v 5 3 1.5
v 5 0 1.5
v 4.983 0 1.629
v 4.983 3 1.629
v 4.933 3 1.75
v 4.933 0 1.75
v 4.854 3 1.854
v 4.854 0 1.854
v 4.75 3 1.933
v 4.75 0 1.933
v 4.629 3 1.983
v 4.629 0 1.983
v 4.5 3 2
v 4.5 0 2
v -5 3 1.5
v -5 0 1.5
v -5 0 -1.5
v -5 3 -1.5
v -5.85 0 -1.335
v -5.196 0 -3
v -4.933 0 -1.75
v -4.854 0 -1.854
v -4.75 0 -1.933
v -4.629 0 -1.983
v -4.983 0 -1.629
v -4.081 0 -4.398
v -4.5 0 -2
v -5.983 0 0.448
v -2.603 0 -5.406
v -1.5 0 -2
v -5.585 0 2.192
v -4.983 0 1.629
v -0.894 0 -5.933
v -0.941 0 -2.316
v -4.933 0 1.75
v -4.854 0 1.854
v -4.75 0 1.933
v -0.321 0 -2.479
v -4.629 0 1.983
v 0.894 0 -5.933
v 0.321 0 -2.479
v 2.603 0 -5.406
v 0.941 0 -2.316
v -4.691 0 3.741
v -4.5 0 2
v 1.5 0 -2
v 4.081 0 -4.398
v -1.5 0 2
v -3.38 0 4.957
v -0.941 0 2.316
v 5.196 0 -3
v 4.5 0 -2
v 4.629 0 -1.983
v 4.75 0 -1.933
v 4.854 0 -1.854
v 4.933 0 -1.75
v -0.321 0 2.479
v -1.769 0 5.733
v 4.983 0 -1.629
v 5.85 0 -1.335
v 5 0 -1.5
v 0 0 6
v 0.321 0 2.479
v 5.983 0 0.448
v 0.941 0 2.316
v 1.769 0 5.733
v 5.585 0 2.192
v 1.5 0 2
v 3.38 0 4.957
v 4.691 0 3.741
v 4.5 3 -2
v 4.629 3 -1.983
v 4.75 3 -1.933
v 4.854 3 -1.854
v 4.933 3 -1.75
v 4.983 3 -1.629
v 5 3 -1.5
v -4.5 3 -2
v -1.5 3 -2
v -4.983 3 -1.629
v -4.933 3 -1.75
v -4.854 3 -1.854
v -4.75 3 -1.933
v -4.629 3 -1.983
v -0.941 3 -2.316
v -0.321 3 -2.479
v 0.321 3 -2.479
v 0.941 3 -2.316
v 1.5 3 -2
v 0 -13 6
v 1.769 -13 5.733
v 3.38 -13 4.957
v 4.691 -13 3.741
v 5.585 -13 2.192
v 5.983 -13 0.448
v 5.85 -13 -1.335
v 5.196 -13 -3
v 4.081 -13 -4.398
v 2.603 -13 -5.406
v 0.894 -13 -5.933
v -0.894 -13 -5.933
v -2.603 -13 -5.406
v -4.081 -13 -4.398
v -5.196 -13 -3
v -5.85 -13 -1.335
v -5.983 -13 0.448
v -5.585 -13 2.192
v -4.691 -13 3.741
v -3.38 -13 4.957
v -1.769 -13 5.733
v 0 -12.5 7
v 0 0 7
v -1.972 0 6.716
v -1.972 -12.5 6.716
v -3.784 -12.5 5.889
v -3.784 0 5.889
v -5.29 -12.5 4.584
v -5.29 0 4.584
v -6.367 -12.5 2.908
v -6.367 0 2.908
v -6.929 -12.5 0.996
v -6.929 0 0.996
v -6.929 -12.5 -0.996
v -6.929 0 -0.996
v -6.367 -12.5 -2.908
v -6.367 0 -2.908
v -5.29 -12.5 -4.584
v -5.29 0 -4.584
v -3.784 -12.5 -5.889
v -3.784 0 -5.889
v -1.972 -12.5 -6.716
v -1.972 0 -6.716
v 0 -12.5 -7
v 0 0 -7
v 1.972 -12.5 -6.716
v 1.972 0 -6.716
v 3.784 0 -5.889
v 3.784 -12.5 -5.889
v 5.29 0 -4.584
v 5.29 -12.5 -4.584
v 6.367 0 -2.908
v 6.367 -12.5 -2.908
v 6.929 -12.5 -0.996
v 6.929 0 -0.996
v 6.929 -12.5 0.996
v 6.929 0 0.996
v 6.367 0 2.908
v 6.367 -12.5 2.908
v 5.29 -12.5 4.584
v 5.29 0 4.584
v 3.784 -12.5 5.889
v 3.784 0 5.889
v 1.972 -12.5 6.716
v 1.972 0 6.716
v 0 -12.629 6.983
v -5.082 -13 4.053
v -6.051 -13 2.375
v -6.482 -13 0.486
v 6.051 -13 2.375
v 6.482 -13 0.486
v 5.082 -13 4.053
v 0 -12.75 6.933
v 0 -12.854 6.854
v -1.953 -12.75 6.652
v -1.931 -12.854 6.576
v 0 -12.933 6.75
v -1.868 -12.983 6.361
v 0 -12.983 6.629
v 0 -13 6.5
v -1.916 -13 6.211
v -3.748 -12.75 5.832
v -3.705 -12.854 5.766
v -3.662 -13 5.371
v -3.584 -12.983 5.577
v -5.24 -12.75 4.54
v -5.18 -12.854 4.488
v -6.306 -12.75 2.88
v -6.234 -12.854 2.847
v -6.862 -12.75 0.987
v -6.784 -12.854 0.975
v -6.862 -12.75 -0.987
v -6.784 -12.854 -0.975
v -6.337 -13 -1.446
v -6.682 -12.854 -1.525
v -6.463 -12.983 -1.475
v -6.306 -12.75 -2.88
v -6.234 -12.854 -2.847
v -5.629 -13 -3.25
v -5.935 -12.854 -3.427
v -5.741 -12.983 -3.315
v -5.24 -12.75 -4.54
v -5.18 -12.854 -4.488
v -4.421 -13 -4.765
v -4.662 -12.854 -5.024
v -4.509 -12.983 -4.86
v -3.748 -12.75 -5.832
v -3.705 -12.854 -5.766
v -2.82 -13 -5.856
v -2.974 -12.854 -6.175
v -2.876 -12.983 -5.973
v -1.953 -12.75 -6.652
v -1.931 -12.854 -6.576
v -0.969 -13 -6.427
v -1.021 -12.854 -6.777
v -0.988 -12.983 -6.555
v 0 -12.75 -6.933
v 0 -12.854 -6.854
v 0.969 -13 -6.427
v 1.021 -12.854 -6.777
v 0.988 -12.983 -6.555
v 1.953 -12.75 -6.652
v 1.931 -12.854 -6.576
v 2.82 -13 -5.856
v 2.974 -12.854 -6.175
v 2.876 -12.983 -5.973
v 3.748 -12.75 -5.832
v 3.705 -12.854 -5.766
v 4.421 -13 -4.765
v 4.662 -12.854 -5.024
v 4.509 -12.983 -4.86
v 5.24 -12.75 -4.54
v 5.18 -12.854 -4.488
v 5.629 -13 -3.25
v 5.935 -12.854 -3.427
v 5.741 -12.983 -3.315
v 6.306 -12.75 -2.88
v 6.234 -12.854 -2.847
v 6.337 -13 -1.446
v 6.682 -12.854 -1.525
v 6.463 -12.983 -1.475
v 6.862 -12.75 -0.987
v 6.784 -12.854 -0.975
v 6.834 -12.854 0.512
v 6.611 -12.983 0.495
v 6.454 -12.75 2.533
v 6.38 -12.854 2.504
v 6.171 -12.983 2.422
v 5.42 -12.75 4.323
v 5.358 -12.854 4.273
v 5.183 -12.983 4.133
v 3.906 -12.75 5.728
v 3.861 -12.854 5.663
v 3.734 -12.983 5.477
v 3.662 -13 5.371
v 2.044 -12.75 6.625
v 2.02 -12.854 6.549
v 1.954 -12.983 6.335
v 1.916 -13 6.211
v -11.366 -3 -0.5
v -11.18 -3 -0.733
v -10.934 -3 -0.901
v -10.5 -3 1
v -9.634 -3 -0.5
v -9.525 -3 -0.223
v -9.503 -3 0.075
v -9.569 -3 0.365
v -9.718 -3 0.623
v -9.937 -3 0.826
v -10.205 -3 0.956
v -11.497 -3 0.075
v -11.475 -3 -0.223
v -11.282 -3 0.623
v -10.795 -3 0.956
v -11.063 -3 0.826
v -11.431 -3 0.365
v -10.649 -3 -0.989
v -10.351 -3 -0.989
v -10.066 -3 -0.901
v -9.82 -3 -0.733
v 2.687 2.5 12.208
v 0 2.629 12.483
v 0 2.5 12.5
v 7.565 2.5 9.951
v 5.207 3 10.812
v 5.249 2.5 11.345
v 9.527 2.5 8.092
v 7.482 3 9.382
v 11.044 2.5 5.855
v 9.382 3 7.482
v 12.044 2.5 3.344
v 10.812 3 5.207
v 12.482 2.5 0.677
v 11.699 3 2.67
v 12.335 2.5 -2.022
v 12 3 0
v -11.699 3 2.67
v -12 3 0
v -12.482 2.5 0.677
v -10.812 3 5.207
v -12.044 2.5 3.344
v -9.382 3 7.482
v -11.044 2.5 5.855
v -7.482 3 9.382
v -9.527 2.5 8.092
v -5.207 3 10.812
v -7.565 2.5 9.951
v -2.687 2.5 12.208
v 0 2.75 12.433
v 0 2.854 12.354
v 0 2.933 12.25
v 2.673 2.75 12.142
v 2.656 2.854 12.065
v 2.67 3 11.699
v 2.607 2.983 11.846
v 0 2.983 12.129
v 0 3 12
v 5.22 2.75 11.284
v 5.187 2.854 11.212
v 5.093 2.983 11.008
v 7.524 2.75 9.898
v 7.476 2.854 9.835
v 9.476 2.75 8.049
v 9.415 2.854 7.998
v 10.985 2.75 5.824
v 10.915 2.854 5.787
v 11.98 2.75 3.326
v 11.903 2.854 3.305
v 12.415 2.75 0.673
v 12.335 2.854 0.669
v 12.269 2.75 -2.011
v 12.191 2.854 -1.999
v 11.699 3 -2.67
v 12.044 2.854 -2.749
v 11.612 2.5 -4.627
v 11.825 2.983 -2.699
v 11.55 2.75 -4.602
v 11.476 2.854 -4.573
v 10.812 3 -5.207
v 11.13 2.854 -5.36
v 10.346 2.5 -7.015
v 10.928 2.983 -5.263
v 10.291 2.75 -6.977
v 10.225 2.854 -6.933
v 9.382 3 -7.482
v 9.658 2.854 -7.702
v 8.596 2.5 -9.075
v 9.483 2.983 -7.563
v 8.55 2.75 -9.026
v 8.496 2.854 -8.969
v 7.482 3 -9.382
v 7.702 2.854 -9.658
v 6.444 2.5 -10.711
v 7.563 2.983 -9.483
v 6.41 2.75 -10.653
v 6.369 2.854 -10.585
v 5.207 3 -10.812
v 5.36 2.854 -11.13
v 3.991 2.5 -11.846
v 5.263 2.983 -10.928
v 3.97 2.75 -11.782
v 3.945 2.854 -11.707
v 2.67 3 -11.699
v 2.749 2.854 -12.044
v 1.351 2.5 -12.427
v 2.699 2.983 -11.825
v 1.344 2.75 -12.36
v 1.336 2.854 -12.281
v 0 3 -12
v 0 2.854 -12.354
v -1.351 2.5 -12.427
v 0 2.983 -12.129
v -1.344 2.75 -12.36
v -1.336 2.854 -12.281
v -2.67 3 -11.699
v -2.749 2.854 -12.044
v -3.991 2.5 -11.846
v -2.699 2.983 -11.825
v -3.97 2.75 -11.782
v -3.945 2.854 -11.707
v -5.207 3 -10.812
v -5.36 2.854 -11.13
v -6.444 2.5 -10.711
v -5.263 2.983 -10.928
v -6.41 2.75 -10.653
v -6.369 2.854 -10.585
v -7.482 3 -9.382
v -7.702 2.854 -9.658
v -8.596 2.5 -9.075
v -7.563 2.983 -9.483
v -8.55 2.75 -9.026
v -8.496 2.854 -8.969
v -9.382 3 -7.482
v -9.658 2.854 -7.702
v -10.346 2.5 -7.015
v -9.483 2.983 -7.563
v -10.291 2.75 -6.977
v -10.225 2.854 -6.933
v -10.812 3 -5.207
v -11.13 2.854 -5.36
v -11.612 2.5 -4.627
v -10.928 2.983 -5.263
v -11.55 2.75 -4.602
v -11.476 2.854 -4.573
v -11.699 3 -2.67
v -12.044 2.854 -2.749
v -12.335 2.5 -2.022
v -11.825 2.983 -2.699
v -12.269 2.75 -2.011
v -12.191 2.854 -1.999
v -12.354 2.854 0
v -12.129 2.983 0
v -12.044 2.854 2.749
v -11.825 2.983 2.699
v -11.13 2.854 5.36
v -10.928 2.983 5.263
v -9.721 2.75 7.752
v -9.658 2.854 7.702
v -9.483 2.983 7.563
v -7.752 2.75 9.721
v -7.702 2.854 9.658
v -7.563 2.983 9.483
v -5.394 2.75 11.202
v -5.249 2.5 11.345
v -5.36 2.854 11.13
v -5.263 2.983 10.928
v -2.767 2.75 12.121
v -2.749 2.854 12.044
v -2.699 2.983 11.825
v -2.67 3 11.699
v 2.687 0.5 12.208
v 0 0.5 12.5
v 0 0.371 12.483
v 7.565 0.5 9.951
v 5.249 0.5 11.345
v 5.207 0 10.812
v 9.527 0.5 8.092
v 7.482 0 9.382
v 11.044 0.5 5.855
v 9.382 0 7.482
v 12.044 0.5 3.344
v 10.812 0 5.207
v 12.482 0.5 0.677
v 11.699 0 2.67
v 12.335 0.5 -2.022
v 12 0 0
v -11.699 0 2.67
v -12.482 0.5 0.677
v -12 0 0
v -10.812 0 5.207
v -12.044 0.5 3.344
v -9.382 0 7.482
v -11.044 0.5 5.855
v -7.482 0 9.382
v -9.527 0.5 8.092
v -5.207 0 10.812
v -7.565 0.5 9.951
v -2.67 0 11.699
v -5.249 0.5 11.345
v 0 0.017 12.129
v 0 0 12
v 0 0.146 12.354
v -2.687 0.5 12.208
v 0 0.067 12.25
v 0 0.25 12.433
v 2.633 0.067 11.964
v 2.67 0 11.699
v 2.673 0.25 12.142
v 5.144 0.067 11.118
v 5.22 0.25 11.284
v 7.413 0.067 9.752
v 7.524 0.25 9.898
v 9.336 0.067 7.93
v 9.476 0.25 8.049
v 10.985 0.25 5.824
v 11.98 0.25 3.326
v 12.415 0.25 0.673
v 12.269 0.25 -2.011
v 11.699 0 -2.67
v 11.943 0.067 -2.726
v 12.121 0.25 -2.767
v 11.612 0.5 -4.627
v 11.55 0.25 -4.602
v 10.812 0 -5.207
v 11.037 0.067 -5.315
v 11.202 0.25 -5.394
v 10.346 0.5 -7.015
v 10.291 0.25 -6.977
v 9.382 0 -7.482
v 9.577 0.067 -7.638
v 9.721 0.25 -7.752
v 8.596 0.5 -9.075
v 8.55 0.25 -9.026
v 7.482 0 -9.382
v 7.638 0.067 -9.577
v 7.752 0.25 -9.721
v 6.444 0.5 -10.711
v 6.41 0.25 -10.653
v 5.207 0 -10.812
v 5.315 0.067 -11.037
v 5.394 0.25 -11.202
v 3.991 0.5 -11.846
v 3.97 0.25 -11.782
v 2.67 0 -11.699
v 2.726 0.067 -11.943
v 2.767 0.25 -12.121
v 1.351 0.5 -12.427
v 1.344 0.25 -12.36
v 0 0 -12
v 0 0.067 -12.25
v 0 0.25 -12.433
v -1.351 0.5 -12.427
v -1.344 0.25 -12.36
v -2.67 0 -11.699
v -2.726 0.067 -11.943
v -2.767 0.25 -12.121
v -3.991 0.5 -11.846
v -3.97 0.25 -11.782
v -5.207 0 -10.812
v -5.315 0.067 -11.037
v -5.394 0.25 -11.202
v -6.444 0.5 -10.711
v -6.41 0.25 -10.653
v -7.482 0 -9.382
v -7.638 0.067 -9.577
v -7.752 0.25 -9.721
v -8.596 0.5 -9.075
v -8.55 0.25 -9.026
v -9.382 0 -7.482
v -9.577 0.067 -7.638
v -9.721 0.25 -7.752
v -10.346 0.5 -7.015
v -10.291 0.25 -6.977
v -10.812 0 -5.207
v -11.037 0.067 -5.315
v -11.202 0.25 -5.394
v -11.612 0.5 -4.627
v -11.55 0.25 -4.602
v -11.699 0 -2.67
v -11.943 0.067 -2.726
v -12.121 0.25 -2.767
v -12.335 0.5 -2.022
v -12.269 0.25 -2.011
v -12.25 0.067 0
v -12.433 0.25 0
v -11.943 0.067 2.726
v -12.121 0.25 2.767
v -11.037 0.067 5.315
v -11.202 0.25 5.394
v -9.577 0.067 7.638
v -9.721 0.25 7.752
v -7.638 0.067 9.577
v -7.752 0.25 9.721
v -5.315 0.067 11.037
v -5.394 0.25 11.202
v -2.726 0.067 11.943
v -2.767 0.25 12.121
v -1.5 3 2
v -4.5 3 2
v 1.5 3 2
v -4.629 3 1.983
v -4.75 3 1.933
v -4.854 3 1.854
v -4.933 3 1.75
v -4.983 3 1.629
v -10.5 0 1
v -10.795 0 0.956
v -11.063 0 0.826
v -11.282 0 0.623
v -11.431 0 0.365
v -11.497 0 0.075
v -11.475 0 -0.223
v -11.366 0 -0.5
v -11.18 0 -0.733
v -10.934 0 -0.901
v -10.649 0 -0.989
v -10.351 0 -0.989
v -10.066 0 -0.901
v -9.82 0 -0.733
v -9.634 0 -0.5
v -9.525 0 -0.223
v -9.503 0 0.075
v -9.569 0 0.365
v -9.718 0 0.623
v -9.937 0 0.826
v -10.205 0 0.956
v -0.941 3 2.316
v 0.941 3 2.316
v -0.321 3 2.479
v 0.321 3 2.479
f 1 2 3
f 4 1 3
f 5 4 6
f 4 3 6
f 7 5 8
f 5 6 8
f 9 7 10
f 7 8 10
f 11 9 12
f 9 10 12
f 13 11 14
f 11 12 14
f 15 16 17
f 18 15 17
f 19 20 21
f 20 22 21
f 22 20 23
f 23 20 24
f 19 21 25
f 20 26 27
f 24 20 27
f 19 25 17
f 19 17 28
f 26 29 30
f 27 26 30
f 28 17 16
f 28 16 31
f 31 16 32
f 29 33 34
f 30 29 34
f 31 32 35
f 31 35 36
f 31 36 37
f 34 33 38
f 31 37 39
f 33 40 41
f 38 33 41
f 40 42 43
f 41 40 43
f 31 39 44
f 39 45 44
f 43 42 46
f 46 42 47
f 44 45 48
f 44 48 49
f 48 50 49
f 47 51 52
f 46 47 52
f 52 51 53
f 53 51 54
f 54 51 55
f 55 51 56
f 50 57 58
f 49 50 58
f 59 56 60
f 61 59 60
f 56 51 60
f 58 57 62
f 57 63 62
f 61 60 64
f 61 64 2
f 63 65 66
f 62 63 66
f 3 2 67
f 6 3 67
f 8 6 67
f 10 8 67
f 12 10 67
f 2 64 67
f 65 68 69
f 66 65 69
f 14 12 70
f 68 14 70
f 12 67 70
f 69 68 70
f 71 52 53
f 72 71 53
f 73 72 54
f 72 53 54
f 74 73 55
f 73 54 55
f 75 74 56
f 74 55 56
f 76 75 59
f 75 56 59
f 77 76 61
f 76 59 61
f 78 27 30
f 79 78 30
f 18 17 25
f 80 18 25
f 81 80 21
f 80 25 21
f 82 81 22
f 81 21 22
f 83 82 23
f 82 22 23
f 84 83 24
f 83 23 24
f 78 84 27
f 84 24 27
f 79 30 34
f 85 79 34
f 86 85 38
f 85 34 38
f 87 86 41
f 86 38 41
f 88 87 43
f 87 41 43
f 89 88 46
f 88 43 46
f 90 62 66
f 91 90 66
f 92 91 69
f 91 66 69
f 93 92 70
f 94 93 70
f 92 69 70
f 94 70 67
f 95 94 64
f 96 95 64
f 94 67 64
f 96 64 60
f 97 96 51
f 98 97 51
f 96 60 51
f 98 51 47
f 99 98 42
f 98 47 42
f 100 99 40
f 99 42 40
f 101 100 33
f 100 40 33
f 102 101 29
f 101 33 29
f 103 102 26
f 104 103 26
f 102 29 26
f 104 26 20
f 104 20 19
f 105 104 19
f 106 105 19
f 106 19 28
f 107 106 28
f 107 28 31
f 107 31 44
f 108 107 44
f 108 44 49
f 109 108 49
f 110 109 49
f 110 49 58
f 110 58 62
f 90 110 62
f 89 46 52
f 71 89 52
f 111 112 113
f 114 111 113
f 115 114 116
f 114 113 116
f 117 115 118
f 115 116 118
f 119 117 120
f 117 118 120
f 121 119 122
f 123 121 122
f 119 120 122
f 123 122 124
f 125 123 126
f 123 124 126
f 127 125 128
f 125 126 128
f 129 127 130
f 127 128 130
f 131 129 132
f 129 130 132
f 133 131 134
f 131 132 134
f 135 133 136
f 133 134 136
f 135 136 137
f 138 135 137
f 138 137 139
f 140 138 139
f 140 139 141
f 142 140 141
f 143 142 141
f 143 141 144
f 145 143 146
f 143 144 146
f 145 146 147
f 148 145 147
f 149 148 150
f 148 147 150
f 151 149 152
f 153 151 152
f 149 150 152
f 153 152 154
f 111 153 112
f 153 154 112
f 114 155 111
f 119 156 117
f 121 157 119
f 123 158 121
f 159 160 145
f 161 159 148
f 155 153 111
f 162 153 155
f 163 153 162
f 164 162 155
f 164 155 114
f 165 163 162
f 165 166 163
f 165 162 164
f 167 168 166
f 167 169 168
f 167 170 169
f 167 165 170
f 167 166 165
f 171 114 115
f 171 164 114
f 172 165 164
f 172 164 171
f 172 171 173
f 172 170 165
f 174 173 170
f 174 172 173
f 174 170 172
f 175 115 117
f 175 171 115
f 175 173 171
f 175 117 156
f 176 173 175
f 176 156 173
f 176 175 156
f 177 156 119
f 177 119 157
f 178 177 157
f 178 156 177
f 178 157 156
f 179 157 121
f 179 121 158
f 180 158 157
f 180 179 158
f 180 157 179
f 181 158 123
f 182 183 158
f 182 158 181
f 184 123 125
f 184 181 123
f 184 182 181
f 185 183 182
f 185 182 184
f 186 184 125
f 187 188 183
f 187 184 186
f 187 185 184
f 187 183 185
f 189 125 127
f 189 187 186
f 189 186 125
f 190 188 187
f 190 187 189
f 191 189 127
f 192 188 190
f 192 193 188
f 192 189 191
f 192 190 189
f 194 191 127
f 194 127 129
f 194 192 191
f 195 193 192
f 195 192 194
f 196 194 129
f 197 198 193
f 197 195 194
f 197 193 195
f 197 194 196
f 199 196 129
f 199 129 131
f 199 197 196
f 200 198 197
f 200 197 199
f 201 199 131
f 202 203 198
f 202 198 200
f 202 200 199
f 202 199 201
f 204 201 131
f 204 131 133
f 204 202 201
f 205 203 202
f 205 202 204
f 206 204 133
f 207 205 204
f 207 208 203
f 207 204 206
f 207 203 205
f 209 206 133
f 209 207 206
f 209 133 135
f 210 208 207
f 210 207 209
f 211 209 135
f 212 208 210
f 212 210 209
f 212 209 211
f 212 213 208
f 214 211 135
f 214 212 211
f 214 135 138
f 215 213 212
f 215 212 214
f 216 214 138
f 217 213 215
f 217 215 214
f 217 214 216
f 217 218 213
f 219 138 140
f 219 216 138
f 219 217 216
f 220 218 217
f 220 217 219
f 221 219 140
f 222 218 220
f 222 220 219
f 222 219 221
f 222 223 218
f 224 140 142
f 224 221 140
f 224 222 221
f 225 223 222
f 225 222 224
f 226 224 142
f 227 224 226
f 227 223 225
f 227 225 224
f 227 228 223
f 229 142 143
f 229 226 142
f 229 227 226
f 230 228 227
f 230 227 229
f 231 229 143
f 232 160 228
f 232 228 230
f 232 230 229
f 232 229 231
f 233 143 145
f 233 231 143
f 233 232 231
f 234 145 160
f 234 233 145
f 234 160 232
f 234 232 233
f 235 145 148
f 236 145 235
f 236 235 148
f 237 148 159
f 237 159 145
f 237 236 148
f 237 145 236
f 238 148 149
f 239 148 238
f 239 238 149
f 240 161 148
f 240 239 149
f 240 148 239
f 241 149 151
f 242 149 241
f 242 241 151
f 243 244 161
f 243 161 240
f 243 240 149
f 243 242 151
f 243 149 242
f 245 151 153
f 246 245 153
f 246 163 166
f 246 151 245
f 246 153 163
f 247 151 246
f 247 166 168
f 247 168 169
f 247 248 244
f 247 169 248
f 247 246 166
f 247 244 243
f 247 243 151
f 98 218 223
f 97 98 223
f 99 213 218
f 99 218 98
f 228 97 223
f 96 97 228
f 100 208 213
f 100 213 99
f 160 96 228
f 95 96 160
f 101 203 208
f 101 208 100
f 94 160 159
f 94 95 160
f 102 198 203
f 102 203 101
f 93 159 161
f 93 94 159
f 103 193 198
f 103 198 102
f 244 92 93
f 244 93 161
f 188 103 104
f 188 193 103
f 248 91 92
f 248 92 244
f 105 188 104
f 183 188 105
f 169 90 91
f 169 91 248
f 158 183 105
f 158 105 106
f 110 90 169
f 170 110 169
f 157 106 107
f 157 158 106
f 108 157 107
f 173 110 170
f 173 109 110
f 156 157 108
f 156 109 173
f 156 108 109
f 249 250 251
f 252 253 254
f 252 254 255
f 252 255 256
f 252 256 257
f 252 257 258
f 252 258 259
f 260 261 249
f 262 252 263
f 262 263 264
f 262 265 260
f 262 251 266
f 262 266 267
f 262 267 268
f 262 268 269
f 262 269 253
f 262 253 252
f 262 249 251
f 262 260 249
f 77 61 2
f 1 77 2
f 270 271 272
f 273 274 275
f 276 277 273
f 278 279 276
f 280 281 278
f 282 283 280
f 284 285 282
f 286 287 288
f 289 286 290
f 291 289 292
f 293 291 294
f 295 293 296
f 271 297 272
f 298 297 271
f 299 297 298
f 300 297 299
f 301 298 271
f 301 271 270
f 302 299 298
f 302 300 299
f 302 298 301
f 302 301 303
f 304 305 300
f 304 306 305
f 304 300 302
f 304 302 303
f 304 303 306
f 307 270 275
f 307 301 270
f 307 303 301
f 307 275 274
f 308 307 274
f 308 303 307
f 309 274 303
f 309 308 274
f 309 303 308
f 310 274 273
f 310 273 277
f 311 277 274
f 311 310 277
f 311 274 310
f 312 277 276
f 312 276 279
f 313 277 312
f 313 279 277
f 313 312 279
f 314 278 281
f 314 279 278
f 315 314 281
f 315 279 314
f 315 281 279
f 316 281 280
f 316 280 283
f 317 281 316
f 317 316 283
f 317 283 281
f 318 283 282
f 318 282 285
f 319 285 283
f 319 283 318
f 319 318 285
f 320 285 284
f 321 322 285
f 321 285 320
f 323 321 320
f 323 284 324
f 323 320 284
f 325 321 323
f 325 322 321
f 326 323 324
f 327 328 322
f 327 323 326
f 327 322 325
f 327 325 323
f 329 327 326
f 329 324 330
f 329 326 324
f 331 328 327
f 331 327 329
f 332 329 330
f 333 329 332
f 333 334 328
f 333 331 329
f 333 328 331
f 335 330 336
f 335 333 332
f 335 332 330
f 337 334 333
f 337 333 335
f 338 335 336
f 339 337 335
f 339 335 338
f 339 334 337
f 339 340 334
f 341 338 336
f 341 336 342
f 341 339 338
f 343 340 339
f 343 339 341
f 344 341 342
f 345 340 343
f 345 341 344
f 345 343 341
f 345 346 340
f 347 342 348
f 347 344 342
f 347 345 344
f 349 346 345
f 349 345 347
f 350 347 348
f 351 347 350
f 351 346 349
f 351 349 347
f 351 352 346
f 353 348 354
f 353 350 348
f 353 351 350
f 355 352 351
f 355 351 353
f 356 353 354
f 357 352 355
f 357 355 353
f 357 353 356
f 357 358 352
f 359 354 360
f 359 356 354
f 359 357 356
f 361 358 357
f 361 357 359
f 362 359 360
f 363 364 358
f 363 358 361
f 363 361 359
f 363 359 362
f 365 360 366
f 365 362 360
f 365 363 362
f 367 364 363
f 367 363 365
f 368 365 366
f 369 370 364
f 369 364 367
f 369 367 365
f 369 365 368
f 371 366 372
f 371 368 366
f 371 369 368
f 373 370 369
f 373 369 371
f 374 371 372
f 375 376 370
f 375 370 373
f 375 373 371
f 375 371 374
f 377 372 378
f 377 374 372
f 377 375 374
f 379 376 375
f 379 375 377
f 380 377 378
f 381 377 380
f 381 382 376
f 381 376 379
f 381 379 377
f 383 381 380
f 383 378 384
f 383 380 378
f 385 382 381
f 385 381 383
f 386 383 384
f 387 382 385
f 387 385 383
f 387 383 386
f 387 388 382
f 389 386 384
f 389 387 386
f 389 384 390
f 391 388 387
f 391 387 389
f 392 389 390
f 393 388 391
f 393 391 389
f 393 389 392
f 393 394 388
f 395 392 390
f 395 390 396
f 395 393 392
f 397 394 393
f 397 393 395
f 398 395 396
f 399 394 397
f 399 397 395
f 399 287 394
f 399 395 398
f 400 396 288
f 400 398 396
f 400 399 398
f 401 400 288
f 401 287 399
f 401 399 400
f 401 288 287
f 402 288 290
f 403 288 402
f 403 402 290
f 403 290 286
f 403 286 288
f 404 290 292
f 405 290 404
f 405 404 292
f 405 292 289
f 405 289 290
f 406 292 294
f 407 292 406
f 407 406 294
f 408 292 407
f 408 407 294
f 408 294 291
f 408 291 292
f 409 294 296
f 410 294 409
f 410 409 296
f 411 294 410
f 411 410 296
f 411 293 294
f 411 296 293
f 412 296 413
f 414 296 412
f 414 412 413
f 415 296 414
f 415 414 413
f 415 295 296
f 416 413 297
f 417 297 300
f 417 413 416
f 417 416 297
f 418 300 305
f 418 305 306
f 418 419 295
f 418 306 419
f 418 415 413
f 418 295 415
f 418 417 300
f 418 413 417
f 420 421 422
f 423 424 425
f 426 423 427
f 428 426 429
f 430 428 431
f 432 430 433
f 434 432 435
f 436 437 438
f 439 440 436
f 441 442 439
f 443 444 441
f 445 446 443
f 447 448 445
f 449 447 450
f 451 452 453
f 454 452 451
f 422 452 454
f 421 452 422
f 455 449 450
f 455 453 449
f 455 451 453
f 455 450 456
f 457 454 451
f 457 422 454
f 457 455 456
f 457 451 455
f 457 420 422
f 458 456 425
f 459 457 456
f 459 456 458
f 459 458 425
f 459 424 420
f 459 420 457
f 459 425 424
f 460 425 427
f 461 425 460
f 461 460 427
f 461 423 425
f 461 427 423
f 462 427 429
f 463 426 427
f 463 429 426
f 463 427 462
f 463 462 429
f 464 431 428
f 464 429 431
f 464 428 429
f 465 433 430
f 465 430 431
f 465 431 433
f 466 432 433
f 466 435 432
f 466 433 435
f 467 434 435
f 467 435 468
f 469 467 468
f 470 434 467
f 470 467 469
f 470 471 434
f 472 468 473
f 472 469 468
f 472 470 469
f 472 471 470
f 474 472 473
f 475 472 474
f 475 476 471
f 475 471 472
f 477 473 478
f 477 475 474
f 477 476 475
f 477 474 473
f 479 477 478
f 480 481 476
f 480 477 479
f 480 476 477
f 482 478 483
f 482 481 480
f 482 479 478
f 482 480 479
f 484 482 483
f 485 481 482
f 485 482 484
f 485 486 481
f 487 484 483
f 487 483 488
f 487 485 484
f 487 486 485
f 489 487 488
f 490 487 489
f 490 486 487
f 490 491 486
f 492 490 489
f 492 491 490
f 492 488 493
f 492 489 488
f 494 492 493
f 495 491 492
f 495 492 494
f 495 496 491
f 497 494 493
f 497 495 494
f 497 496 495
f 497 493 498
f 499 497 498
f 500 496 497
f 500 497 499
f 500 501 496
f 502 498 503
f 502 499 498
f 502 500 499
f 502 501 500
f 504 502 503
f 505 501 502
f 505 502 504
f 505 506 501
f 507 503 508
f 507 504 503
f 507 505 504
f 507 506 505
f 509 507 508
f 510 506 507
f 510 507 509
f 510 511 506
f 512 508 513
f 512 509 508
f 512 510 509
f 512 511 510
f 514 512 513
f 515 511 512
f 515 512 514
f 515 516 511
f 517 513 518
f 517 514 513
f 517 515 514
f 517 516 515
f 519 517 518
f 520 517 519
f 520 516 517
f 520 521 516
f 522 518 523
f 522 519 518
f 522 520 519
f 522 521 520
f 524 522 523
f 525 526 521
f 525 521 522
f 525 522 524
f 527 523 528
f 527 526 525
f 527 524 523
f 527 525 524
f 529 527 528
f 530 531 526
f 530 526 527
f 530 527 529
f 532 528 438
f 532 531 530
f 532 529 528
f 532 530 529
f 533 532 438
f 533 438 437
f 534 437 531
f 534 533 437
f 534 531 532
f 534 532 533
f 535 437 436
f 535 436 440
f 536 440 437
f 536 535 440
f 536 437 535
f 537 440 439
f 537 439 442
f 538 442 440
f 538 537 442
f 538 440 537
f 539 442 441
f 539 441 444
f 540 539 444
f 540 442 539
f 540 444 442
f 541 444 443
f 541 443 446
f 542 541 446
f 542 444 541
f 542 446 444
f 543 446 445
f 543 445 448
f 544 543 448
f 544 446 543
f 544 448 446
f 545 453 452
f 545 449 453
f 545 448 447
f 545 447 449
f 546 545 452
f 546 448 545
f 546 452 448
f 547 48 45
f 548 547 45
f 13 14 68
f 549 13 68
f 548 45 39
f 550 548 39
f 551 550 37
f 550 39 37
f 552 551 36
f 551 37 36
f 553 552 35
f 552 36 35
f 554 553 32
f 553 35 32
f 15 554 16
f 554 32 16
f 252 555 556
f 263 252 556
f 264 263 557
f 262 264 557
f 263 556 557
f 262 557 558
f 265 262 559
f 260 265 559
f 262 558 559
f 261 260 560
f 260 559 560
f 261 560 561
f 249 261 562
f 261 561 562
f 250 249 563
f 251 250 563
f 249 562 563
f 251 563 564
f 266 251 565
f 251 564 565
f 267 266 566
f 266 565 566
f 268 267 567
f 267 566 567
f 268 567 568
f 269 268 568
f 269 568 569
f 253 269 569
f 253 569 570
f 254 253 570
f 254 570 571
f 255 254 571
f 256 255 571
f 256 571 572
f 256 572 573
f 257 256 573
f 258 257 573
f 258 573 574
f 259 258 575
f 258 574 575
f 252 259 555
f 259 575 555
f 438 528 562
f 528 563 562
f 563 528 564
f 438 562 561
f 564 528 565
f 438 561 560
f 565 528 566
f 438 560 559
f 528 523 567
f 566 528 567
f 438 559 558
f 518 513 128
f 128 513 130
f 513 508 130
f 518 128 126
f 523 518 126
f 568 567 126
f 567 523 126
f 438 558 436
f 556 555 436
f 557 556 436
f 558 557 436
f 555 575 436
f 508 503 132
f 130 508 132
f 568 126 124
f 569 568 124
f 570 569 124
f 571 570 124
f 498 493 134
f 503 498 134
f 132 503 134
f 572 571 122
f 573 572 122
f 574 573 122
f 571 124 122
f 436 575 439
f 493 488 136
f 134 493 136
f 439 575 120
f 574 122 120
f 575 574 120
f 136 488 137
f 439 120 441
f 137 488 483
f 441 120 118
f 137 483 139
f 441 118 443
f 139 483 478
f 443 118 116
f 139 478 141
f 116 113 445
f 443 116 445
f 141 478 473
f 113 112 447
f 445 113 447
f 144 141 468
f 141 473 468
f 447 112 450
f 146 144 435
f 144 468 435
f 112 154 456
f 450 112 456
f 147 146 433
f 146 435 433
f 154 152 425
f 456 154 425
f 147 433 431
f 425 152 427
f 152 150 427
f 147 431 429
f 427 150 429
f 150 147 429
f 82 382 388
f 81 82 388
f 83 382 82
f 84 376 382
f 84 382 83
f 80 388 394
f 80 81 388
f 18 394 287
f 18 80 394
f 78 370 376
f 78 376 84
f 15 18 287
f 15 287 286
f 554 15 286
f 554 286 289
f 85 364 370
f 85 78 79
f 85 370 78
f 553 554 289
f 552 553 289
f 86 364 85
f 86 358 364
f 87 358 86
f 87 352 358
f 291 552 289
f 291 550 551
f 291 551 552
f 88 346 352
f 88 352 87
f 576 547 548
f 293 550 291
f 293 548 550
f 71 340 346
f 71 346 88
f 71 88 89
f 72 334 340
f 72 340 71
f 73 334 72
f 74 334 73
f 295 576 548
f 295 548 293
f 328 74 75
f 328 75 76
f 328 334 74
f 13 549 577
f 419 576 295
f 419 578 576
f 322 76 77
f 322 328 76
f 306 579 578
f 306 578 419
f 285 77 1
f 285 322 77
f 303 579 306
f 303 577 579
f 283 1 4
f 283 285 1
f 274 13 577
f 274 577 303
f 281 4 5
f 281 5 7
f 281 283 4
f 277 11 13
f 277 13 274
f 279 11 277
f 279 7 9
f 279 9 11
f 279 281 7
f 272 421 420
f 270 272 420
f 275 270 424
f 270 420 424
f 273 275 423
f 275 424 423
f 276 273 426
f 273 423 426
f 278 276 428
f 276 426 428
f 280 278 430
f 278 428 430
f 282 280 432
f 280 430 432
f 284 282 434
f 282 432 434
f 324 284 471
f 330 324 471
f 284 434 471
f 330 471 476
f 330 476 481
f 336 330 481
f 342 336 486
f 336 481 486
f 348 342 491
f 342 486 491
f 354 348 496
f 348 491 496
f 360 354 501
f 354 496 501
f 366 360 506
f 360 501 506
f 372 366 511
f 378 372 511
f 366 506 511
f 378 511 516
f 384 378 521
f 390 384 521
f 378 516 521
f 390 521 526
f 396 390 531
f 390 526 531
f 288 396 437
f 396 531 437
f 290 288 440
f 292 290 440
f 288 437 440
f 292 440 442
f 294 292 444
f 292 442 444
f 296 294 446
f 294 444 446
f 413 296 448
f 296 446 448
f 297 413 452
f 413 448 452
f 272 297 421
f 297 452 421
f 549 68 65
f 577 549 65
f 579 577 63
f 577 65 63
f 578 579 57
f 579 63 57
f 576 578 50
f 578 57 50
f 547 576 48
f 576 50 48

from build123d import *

# Parameters (mm, degrees)
SKETCH1_R           = 12.5
BOSS_EXTRUDE1_DEPTH = 3
SKETCH3_R           = 1
BOSS_EXTRUDE2_DEPTH = 3
SKETCH4_R           = 7
BOSS_EXTRUDE3_DEPTH = 13
CUT_EXTRUDE1_REACH  = 23.943
SKETCH5_R           = 6
FILLET2_R           = 0.5
FILLET3_R           = 0.5


with BuildPart() as part:
    # Sketch1 → Boss-Extrude1 (new body)
    with BuildSketch(Plane(origin=(0, 0, 0), x_dir=(1, 0, 0), z_dir=(0, 1, 0))):
        with Locations(Location((0, 0, 0), (0, 0, 270))):
            Circle(SKETCH1_R)
        with BuildLine():
            Line((1.5, 2), (4.5, 2))
            ThreePointArc((4.5, 2), (4.853553391, 1.853553391), (5, 1.5))
            Line((5, 1.5), (5, -1.5))
            ThreePointArc((5, -1.5), (4.853553391, -1.853553391), (4.5, -2))
            Line((4.5, -2), (1.5, -2))
            ThreePointArc((1.5, -2), (0, -2.5), (-1.5, -2))
            Line((-1.5, -2), (-4.5, -2))
            ThreePointArc((-4.5, -2), (-4.853553391, -1.853553391), (-5, -1.5))
            Line((-5, -1.5), (-5, 1.5))
            ThreePointArc((-5, 1.5), (-4.853553391, 1.853553391), (-4.5, 2))
            Line((-4.5, 2), (-1.5, 2))
            ThreePointArc((-1.5, 2), (0, 2.5), (1.5, 2))
        make_face(mode=Mode.SUBTRACT)
    extrude(amount=BOSS_EXTRUDE1_DEPTH)

    # Sketch3 → Boss-Extrude2 (add)
    with BuildSketch(Plane.XZ):
        with Locations(Location((-10.5, 0, 0), (0, 0, 90))):
            Circle(SKETCH3_R)
    extrude(amount=BOSS_EXTRUDE2_DEPTH)

    # Sketch4 → Boss-Extrude3 (add)
    with BuildSketch(Plane.XZ):
        with Locations(Location((0, 0, 0), (0, 0, 90))):
            Circle(SKETCH4_R)
    extrude(amount=BOSS_EXTRUDE3_DEPTH)

    # Sketch5 → Cut-Extrude1 (cut, up to next)
    with BuildSketch(Plane(origin=(0, 0, 0), x_dir=(1, 0, 0), z_dir=(0, 1, 0)), mode=Mode.PRIVATE) as cut_extrude1_sk1:
        with Locations(Location((0, 0, 0), (0, 0, 270))):
            Circle(SKETCH5_R)
    cut_extrude1_tool1 = extrude(cut_extrude1_sk1.sketch, amount=-CUT_EXTRUDE1_REACH, mode=Mode.PRIVATE) & part.part
    add(cut_extrude1_tool1.solids().sort_by_distance((0, 0, 0))[0], mode=Mode.SUBTRACT)

    # Fillet2
    fillet2_edges = [part.edges().sort_by_distance(p)[0] for p in [
        (0, 0, -12.5),
        (0, 3, -12.5),
    ]]
    fillet(fillet2_edges, radius=FILLET2_R)

    # Fillet3
    fillet3_edges = [part.edges().sort_by_distance(p)[0] for p in [
        (0, -13, -7),
    ]]
    fillet(fillet3_edges, radius=FILLET3_R)


solid = part.part
